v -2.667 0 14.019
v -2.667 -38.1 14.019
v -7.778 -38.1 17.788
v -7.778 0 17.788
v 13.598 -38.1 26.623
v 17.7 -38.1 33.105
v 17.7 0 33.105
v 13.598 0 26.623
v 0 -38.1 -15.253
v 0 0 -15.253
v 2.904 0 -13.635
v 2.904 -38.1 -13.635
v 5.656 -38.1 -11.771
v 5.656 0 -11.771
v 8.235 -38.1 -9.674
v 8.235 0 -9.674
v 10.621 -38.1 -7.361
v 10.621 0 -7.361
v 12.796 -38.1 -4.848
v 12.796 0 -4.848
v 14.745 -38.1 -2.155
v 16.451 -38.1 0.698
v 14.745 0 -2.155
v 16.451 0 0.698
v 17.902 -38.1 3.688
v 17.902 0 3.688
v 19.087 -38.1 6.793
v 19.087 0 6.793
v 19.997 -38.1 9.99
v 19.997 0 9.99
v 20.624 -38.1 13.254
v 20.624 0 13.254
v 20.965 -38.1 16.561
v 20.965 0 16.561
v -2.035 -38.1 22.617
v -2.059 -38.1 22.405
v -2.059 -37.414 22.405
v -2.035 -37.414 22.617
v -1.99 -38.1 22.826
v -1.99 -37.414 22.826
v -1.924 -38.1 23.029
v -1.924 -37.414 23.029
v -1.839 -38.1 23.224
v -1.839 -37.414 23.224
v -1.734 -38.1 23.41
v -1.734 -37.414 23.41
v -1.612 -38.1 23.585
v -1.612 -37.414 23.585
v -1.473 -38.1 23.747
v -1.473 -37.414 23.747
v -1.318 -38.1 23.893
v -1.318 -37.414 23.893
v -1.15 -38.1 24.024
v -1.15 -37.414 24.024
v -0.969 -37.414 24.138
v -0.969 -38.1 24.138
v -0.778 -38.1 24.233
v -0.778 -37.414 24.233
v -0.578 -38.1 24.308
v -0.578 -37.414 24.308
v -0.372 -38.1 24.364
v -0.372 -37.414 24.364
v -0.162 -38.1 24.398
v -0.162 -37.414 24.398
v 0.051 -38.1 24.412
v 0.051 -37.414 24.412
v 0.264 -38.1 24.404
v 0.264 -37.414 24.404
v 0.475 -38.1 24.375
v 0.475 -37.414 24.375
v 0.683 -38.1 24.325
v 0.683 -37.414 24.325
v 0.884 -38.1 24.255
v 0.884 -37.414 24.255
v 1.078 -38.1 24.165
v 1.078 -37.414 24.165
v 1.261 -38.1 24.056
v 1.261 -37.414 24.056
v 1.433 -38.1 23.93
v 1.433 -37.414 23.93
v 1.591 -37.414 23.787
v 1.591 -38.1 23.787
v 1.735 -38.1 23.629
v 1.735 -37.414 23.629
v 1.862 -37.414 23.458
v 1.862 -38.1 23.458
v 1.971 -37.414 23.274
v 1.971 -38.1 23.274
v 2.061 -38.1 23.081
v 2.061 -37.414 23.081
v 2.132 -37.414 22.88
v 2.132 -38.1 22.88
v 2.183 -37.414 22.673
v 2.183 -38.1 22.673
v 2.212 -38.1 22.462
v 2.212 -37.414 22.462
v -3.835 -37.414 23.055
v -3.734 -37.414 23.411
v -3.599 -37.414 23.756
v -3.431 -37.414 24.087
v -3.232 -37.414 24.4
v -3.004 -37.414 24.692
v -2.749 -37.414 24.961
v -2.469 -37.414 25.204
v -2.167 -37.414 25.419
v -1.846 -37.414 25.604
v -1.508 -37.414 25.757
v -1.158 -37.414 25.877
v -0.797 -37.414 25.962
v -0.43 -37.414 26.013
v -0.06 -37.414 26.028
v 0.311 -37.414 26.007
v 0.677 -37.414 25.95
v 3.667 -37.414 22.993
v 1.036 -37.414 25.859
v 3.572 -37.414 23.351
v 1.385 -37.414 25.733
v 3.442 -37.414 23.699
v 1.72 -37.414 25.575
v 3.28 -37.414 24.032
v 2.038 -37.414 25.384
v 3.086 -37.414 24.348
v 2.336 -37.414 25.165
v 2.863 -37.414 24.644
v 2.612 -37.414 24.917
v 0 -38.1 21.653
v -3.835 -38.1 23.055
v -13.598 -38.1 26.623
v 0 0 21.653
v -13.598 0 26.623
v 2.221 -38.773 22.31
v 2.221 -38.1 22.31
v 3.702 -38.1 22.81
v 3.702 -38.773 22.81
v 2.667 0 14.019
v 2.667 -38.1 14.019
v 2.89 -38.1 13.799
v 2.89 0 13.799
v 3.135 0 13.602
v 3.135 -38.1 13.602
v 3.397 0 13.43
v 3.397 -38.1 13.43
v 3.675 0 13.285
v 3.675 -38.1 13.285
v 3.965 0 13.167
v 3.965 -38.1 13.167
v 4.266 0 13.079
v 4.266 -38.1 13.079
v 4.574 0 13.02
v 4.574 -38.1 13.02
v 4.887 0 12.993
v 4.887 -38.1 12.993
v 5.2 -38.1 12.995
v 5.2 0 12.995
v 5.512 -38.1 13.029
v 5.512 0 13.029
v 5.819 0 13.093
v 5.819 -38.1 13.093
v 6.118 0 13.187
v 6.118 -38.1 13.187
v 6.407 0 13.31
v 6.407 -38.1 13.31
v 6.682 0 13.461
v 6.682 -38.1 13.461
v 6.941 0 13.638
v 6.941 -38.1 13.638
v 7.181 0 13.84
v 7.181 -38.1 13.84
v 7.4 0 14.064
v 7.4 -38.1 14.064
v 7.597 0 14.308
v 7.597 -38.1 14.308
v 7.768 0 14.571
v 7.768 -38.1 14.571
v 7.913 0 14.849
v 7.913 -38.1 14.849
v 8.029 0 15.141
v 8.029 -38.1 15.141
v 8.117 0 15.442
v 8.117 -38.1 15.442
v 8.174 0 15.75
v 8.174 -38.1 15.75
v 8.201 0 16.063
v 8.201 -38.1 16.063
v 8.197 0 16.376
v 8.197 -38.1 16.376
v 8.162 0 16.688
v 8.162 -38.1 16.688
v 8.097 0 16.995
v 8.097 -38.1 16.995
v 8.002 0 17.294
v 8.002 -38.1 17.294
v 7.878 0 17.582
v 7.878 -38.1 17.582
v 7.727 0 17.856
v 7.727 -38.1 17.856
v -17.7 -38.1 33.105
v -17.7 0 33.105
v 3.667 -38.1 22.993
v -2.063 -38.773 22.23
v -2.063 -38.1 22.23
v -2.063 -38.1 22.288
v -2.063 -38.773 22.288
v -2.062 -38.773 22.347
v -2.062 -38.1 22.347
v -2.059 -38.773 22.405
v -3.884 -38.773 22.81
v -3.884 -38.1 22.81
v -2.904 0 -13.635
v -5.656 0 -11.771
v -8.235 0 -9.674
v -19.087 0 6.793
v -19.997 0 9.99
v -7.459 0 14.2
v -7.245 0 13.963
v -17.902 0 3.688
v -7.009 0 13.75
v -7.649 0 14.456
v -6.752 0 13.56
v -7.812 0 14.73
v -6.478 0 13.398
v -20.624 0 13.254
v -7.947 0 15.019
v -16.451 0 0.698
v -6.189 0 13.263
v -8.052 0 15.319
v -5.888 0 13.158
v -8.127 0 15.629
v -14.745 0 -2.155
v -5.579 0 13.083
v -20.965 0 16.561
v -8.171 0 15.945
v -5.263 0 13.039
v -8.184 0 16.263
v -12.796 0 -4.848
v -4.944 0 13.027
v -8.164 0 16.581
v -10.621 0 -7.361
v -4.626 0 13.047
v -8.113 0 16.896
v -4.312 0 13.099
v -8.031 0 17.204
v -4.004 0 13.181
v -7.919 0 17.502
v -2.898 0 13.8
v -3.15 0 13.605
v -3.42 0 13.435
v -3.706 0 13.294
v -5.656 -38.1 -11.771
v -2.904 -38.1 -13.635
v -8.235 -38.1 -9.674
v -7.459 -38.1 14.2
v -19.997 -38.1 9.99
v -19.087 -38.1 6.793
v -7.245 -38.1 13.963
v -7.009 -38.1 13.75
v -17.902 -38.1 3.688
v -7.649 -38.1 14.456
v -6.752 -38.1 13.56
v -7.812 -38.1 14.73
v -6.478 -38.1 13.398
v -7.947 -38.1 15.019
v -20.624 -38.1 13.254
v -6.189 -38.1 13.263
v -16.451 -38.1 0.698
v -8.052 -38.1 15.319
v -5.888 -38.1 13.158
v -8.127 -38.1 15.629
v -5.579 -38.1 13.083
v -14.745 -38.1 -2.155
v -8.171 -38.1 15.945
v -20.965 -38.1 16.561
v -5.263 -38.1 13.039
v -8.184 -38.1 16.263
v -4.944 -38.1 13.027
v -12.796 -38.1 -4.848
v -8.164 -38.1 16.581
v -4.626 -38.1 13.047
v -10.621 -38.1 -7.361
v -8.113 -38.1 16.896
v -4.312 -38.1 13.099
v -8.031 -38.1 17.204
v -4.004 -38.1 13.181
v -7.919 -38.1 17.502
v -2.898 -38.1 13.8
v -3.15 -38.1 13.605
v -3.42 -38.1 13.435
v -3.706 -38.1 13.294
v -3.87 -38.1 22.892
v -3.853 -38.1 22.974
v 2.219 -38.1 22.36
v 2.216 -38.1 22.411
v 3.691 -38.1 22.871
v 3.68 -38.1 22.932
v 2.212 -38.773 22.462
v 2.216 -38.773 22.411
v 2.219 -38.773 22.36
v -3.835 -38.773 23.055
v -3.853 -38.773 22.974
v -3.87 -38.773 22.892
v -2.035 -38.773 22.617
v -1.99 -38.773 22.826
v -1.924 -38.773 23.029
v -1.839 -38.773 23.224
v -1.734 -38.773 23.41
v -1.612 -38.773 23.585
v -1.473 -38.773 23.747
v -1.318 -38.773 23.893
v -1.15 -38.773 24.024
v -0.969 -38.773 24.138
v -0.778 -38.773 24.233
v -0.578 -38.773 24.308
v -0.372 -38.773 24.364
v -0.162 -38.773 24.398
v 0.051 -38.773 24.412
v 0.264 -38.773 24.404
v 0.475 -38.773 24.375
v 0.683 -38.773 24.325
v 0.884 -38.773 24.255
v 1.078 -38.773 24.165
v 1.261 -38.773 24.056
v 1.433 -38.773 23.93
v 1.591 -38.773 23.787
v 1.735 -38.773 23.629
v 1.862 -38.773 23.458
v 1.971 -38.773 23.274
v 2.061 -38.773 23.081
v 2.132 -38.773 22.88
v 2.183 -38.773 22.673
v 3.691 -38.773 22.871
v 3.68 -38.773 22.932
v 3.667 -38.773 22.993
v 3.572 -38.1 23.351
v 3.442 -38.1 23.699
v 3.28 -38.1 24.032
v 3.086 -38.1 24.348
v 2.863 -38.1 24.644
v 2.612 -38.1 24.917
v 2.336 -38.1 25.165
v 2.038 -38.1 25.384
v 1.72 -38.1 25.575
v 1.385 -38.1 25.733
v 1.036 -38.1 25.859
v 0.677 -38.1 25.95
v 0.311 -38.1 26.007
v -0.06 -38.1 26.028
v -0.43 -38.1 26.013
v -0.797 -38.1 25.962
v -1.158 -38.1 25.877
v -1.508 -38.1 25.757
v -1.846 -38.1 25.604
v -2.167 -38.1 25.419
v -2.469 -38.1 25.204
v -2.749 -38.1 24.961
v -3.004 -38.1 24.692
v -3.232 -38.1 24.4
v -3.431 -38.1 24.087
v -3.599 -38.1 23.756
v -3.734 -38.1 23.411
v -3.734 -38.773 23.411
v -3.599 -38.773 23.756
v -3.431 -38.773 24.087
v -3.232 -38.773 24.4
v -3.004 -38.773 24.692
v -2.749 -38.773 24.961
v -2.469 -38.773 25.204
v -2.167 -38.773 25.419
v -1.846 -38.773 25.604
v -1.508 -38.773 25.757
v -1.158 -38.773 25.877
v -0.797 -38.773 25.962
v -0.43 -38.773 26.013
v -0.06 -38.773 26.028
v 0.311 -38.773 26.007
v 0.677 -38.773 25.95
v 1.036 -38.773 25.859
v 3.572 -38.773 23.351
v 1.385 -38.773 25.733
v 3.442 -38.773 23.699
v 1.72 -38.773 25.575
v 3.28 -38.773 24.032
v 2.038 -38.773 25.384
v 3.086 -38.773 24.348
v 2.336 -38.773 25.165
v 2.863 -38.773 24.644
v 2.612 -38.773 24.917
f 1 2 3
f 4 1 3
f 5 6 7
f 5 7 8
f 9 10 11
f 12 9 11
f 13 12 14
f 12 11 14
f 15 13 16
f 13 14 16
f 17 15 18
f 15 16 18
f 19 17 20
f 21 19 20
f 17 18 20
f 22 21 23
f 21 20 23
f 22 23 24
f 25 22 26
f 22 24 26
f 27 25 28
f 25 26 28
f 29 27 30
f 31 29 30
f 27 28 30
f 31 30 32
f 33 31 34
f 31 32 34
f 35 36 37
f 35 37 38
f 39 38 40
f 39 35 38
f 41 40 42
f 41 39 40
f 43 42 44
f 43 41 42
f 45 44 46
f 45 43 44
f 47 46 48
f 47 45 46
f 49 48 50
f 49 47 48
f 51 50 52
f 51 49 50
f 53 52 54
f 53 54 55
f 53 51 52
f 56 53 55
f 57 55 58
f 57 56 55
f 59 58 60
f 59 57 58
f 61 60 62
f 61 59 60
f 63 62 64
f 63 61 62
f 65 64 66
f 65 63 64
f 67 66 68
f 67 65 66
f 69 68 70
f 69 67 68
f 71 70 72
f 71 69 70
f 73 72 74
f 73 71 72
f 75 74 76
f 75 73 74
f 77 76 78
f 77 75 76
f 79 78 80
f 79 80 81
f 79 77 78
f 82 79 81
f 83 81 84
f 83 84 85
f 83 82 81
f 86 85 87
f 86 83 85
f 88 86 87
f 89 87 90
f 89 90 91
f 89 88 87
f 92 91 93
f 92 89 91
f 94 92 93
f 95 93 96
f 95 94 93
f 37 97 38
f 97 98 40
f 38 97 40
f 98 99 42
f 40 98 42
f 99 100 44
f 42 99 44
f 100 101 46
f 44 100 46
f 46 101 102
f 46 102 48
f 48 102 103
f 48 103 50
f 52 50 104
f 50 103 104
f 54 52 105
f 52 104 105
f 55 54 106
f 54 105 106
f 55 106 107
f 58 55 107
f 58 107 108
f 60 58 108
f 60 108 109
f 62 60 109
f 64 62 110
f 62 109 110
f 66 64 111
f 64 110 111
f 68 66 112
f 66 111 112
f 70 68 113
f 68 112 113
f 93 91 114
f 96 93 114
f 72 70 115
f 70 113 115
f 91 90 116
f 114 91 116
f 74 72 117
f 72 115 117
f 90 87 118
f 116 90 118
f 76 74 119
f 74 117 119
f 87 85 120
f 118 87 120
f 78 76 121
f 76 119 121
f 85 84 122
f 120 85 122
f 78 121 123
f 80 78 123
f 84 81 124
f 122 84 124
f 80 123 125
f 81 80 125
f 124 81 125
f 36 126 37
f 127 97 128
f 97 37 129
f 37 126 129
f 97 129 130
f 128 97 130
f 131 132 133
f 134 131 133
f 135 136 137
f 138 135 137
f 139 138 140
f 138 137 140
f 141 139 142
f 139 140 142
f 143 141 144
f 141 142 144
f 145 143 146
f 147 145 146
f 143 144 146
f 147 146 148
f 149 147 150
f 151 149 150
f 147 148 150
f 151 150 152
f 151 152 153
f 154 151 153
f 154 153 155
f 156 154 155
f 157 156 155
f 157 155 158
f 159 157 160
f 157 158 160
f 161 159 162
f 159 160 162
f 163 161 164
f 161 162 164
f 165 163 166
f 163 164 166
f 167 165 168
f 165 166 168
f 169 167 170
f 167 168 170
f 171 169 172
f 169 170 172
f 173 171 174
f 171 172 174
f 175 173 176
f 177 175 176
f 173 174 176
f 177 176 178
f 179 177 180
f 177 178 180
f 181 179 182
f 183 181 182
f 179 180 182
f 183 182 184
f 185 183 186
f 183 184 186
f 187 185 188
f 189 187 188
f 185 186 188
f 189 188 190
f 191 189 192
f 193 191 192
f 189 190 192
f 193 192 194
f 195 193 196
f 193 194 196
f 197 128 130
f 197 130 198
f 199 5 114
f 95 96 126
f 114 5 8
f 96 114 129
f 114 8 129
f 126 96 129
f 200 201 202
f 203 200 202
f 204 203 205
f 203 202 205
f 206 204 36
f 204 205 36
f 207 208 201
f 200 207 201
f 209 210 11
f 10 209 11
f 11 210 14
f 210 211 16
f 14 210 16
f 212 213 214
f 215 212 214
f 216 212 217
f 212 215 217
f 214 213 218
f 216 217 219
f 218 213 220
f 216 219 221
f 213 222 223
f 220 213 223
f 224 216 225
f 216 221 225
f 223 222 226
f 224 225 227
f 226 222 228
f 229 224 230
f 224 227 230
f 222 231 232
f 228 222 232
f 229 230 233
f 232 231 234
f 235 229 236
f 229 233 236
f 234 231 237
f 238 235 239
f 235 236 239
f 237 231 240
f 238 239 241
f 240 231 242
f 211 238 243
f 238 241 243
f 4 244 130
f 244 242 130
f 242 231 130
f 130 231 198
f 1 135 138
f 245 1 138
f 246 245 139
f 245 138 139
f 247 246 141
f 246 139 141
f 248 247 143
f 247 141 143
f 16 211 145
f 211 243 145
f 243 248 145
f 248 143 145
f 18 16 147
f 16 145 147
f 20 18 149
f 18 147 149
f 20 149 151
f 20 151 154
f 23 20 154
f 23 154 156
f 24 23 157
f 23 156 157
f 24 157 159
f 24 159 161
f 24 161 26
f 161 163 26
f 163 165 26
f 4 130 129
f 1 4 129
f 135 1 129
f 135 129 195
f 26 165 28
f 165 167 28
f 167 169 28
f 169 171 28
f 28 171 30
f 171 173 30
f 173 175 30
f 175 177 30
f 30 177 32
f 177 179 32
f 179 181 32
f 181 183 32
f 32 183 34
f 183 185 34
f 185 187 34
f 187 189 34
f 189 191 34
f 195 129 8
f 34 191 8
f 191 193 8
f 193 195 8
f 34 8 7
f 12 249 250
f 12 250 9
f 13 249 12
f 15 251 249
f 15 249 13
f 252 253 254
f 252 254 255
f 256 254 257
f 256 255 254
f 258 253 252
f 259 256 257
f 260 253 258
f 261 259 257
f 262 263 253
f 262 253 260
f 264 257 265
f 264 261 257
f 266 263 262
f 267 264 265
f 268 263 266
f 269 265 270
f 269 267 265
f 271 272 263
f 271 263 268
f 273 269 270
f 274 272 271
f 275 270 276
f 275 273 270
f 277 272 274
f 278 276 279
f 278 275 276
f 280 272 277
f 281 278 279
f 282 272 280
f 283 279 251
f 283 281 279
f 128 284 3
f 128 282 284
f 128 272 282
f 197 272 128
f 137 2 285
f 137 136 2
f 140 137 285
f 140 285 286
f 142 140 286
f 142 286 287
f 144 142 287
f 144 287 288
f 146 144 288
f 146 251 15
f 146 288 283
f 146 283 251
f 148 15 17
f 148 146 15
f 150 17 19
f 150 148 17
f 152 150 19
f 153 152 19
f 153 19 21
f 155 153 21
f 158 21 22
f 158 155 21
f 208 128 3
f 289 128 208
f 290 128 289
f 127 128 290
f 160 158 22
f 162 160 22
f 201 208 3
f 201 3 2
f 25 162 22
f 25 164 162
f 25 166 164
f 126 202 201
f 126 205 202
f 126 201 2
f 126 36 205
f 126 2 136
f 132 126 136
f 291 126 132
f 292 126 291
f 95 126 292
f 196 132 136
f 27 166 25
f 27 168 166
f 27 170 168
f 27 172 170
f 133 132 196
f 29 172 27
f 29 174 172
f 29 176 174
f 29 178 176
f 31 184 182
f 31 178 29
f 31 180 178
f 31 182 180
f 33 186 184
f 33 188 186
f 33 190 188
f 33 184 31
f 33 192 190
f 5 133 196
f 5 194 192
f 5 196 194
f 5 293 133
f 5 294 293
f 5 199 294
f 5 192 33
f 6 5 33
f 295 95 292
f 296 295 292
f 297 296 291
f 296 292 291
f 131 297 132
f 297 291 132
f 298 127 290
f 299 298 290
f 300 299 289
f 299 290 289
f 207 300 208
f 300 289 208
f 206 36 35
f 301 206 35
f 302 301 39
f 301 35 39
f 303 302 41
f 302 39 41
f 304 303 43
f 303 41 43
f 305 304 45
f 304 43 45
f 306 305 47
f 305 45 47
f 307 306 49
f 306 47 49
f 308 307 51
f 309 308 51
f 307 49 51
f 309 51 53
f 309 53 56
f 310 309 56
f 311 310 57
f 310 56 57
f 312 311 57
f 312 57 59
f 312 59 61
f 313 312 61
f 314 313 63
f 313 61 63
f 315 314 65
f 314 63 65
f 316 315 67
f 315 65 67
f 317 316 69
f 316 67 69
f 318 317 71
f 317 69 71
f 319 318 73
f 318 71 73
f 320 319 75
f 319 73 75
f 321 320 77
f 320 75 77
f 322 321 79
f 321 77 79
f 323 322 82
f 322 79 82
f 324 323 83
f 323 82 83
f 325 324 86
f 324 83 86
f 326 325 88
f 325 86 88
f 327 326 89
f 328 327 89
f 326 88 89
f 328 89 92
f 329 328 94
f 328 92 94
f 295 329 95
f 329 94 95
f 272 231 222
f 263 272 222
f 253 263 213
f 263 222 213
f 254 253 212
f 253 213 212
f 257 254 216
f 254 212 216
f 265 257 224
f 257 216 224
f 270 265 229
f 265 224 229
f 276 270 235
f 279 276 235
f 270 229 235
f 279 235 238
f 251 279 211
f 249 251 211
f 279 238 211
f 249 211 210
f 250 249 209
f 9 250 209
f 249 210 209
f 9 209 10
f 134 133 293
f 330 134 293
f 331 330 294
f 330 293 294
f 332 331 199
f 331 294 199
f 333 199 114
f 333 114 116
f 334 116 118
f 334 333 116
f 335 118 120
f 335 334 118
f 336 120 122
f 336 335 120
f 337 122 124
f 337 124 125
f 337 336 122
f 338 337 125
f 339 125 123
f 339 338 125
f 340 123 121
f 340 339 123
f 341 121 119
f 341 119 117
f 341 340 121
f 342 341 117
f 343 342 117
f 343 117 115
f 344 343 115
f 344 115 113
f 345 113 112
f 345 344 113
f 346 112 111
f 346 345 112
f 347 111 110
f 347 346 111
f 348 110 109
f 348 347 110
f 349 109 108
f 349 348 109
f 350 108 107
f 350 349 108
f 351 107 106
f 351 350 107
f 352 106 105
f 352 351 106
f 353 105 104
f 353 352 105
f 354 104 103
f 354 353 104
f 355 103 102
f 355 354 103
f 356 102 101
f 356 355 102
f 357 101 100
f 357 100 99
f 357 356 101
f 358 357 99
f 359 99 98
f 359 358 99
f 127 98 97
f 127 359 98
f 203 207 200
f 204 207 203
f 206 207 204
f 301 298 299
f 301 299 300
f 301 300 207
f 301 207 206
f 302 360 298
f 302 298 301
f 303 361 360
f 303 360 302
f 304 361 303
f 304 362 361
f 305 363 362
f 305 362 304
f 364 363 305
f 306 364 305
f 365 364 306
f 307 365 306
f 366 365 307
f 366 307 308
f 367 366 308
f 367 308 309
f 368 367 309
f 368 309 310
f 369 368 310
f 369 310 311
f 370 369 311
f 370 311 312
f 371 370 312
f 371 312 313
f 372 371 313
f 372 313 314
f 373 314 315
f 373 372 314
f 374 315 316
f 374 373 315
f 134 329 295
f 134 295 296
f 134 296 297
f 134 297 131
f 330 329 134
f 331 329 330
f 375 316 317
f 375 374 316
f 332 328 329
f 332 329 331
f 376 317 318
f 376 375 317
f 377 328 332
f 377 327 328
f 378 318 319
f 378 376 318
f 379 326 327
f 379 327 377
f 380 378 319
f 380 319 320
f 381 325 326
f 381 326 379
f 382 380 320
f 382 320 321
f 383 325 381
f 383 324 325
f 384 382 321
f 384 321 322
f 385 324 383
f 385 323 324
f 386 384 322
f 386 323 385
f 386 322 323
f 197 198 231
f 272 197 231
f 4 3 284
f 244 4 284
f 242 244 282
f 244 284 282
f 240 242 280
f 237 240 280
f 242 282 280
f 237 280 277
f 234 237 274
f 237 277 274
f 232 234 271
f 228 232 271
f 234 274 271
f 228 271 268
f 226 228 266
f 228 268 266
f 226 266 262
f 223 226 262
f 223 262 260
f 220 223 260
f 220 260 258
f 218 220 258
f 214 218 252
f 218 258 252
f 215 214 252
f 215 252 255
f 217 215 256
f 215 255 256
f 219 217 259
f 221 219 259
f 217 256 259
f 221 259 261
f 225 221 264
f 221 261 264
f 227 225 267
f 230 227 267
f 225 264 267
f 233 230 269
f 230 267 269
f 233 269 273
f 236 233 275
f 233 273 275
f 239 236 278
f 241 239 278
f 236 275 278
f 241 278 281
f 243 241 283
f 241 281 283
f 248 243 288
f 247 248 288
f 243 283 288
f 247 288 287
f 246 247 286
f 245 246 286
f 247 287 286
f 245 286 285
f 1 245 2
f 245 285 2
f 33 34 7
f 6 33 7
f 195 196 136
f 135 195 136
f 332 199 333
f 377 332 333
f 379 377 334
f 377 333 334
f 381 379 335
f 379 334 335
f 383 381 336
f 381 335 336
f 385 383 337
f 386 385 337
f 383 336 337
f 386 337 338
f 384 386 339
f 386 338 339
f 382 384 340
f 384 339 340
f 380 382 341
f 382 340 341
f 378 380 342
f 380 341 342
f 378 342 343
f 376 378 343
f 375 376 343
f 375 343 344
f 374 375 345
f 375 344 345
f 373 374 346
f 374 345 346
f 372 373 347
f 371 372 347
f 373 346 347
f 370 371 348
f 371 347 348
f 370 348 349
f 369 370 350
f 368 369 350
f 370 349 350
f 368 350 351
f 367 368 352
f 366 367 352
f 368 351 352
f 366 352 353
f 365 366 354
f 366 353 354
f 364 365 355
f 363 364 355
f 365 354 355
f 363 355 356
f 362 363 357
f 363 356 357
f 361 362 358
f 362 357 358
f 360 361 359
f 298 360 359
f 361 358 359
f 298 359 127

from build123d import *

# Parameters (mm, degrees)
F1_DEPTH      = 38.1
F3_DEPTH      = 38.1
F5_DEPTH      = 0.6731
F5_DEPTH_BACK = 0.6858


with BuildPart() as f1:
    # F0 (on Front) → F1 (new body)
    with BuildSketch(Plane.XZ):
        with BuildLine():
            Line((-17.6997391722, 33.1053871185), (-20.9649930975, 16.5606186919))
            ThreePointArc((-20.9649930975, 16.5606186919), (-14.7446558469, -2.1547528437), (0, -15.2525714094))
            ThreePointArc((0, -15.2525714094), (14.7446558469, -2.1547528437), (20.9649930975, 16.5606186919))
            Line((20.9649930975, 16.5606186919), (17.6997391722, 33.1053871185))
            Line((17.6997391722, 33.1053871185), (13.5980615388, 26.6233030993))
            Line((13.5980615388, 26.6233030993), (0, 21.6528698802))
            Line((0, 21.6528698802), (-13.5980615388, 26.6233030993))
            Line((-13.5980615388, 26.6233030993), (-17.6997391722, 33.1053871185))
        make_face()
    extrude(amount=F1_DEPTH)

    # F2 (on face) → F3 (cut)
    with BuildSketch(Plane.XZ.offset(38.1)):
        with BuildLine():
            Line((7.7268123423, 17.8562299685), (2.667, 14.0194606165))
            ThreePointArc((2.667, 14.0194606165), (6.9408367243, 13.6380038042), (7.7268123423, 17.8562299685))
        make_face()
        with BuildLine():
            Line((-2.667, 14.0194606165), (-7.7777689272, 17.7880864898))
            ThreePointArc((-7.7777689272, 17.7880864898), (-6.8829468537, 13.6518252435), (-2.667, 14.0194606165))
        make_face()
    extrude(amount=-F3_DEPTH, mode=Mode.SUBTRACT)

    # F4 (on face) → F5 (join, two sides)
    with BuildSketch(Plane.XZ.offset(38.1)) as f5_sk:
        with BuildLine():
            Line((2.220712835, 22.3098099232), (3.7018435542, 22.8101927787))
            ThreePointArc((3.7018435542, 22.8101927787), (3.6855396388, 22.9019358085), (3.6670169682, 22.9932567362))
            Line((3.6670169682, 22.9932567362), (2.2124818439, 22.461587595))
            ThreePointArc((2.2124818439, 22.461587595), (2.2179440641, 22.3857717928), (2.220712835, 22.3098099232))
        make_face()
        with BuildLine():
            Line((2.2124818439, 22.461587595), (3.6670169682, 22.9932567362))
            ThreePointArc((3.6670169682, 22.9932567362), (-0.0595272983, 26.0276638545), (-3.8353356865, 23.0547814577))
            Line((-3.8353356865, 23.0547814577), (-2.0586373149, 22.4053535535))
            ThreePointArc((-2.0586373149, 22.4053535535), (0.0508779389, 24.4116036609), (2.2124818439, 22.461587595))
        make_face()
        with BuildLine():
            Line((-2.0586373149, 22.4053535535), (-3.8353356865, 23.0547814577))
            ThreePointArc((-3.8353356865, 23.0547814577), (-3.8616258801, 22.9328813979), (-3.8839485496, 22.8101927787))
            Line((-3.8839485496, 22.8101927787), (-2.0625579637, 22.2297497094))
            ThreePointArc((-2.0625579637, 22.2297497094), (-2.0623983648, 22.3175918356), (-2.0586373149, 22.4053535535))
        make_face()
    extrude(amount=F5_DEPTH)
    extrude(f5_sk.sketch, amount=-F5_DEPTH_BACK)


solid = f1.part
